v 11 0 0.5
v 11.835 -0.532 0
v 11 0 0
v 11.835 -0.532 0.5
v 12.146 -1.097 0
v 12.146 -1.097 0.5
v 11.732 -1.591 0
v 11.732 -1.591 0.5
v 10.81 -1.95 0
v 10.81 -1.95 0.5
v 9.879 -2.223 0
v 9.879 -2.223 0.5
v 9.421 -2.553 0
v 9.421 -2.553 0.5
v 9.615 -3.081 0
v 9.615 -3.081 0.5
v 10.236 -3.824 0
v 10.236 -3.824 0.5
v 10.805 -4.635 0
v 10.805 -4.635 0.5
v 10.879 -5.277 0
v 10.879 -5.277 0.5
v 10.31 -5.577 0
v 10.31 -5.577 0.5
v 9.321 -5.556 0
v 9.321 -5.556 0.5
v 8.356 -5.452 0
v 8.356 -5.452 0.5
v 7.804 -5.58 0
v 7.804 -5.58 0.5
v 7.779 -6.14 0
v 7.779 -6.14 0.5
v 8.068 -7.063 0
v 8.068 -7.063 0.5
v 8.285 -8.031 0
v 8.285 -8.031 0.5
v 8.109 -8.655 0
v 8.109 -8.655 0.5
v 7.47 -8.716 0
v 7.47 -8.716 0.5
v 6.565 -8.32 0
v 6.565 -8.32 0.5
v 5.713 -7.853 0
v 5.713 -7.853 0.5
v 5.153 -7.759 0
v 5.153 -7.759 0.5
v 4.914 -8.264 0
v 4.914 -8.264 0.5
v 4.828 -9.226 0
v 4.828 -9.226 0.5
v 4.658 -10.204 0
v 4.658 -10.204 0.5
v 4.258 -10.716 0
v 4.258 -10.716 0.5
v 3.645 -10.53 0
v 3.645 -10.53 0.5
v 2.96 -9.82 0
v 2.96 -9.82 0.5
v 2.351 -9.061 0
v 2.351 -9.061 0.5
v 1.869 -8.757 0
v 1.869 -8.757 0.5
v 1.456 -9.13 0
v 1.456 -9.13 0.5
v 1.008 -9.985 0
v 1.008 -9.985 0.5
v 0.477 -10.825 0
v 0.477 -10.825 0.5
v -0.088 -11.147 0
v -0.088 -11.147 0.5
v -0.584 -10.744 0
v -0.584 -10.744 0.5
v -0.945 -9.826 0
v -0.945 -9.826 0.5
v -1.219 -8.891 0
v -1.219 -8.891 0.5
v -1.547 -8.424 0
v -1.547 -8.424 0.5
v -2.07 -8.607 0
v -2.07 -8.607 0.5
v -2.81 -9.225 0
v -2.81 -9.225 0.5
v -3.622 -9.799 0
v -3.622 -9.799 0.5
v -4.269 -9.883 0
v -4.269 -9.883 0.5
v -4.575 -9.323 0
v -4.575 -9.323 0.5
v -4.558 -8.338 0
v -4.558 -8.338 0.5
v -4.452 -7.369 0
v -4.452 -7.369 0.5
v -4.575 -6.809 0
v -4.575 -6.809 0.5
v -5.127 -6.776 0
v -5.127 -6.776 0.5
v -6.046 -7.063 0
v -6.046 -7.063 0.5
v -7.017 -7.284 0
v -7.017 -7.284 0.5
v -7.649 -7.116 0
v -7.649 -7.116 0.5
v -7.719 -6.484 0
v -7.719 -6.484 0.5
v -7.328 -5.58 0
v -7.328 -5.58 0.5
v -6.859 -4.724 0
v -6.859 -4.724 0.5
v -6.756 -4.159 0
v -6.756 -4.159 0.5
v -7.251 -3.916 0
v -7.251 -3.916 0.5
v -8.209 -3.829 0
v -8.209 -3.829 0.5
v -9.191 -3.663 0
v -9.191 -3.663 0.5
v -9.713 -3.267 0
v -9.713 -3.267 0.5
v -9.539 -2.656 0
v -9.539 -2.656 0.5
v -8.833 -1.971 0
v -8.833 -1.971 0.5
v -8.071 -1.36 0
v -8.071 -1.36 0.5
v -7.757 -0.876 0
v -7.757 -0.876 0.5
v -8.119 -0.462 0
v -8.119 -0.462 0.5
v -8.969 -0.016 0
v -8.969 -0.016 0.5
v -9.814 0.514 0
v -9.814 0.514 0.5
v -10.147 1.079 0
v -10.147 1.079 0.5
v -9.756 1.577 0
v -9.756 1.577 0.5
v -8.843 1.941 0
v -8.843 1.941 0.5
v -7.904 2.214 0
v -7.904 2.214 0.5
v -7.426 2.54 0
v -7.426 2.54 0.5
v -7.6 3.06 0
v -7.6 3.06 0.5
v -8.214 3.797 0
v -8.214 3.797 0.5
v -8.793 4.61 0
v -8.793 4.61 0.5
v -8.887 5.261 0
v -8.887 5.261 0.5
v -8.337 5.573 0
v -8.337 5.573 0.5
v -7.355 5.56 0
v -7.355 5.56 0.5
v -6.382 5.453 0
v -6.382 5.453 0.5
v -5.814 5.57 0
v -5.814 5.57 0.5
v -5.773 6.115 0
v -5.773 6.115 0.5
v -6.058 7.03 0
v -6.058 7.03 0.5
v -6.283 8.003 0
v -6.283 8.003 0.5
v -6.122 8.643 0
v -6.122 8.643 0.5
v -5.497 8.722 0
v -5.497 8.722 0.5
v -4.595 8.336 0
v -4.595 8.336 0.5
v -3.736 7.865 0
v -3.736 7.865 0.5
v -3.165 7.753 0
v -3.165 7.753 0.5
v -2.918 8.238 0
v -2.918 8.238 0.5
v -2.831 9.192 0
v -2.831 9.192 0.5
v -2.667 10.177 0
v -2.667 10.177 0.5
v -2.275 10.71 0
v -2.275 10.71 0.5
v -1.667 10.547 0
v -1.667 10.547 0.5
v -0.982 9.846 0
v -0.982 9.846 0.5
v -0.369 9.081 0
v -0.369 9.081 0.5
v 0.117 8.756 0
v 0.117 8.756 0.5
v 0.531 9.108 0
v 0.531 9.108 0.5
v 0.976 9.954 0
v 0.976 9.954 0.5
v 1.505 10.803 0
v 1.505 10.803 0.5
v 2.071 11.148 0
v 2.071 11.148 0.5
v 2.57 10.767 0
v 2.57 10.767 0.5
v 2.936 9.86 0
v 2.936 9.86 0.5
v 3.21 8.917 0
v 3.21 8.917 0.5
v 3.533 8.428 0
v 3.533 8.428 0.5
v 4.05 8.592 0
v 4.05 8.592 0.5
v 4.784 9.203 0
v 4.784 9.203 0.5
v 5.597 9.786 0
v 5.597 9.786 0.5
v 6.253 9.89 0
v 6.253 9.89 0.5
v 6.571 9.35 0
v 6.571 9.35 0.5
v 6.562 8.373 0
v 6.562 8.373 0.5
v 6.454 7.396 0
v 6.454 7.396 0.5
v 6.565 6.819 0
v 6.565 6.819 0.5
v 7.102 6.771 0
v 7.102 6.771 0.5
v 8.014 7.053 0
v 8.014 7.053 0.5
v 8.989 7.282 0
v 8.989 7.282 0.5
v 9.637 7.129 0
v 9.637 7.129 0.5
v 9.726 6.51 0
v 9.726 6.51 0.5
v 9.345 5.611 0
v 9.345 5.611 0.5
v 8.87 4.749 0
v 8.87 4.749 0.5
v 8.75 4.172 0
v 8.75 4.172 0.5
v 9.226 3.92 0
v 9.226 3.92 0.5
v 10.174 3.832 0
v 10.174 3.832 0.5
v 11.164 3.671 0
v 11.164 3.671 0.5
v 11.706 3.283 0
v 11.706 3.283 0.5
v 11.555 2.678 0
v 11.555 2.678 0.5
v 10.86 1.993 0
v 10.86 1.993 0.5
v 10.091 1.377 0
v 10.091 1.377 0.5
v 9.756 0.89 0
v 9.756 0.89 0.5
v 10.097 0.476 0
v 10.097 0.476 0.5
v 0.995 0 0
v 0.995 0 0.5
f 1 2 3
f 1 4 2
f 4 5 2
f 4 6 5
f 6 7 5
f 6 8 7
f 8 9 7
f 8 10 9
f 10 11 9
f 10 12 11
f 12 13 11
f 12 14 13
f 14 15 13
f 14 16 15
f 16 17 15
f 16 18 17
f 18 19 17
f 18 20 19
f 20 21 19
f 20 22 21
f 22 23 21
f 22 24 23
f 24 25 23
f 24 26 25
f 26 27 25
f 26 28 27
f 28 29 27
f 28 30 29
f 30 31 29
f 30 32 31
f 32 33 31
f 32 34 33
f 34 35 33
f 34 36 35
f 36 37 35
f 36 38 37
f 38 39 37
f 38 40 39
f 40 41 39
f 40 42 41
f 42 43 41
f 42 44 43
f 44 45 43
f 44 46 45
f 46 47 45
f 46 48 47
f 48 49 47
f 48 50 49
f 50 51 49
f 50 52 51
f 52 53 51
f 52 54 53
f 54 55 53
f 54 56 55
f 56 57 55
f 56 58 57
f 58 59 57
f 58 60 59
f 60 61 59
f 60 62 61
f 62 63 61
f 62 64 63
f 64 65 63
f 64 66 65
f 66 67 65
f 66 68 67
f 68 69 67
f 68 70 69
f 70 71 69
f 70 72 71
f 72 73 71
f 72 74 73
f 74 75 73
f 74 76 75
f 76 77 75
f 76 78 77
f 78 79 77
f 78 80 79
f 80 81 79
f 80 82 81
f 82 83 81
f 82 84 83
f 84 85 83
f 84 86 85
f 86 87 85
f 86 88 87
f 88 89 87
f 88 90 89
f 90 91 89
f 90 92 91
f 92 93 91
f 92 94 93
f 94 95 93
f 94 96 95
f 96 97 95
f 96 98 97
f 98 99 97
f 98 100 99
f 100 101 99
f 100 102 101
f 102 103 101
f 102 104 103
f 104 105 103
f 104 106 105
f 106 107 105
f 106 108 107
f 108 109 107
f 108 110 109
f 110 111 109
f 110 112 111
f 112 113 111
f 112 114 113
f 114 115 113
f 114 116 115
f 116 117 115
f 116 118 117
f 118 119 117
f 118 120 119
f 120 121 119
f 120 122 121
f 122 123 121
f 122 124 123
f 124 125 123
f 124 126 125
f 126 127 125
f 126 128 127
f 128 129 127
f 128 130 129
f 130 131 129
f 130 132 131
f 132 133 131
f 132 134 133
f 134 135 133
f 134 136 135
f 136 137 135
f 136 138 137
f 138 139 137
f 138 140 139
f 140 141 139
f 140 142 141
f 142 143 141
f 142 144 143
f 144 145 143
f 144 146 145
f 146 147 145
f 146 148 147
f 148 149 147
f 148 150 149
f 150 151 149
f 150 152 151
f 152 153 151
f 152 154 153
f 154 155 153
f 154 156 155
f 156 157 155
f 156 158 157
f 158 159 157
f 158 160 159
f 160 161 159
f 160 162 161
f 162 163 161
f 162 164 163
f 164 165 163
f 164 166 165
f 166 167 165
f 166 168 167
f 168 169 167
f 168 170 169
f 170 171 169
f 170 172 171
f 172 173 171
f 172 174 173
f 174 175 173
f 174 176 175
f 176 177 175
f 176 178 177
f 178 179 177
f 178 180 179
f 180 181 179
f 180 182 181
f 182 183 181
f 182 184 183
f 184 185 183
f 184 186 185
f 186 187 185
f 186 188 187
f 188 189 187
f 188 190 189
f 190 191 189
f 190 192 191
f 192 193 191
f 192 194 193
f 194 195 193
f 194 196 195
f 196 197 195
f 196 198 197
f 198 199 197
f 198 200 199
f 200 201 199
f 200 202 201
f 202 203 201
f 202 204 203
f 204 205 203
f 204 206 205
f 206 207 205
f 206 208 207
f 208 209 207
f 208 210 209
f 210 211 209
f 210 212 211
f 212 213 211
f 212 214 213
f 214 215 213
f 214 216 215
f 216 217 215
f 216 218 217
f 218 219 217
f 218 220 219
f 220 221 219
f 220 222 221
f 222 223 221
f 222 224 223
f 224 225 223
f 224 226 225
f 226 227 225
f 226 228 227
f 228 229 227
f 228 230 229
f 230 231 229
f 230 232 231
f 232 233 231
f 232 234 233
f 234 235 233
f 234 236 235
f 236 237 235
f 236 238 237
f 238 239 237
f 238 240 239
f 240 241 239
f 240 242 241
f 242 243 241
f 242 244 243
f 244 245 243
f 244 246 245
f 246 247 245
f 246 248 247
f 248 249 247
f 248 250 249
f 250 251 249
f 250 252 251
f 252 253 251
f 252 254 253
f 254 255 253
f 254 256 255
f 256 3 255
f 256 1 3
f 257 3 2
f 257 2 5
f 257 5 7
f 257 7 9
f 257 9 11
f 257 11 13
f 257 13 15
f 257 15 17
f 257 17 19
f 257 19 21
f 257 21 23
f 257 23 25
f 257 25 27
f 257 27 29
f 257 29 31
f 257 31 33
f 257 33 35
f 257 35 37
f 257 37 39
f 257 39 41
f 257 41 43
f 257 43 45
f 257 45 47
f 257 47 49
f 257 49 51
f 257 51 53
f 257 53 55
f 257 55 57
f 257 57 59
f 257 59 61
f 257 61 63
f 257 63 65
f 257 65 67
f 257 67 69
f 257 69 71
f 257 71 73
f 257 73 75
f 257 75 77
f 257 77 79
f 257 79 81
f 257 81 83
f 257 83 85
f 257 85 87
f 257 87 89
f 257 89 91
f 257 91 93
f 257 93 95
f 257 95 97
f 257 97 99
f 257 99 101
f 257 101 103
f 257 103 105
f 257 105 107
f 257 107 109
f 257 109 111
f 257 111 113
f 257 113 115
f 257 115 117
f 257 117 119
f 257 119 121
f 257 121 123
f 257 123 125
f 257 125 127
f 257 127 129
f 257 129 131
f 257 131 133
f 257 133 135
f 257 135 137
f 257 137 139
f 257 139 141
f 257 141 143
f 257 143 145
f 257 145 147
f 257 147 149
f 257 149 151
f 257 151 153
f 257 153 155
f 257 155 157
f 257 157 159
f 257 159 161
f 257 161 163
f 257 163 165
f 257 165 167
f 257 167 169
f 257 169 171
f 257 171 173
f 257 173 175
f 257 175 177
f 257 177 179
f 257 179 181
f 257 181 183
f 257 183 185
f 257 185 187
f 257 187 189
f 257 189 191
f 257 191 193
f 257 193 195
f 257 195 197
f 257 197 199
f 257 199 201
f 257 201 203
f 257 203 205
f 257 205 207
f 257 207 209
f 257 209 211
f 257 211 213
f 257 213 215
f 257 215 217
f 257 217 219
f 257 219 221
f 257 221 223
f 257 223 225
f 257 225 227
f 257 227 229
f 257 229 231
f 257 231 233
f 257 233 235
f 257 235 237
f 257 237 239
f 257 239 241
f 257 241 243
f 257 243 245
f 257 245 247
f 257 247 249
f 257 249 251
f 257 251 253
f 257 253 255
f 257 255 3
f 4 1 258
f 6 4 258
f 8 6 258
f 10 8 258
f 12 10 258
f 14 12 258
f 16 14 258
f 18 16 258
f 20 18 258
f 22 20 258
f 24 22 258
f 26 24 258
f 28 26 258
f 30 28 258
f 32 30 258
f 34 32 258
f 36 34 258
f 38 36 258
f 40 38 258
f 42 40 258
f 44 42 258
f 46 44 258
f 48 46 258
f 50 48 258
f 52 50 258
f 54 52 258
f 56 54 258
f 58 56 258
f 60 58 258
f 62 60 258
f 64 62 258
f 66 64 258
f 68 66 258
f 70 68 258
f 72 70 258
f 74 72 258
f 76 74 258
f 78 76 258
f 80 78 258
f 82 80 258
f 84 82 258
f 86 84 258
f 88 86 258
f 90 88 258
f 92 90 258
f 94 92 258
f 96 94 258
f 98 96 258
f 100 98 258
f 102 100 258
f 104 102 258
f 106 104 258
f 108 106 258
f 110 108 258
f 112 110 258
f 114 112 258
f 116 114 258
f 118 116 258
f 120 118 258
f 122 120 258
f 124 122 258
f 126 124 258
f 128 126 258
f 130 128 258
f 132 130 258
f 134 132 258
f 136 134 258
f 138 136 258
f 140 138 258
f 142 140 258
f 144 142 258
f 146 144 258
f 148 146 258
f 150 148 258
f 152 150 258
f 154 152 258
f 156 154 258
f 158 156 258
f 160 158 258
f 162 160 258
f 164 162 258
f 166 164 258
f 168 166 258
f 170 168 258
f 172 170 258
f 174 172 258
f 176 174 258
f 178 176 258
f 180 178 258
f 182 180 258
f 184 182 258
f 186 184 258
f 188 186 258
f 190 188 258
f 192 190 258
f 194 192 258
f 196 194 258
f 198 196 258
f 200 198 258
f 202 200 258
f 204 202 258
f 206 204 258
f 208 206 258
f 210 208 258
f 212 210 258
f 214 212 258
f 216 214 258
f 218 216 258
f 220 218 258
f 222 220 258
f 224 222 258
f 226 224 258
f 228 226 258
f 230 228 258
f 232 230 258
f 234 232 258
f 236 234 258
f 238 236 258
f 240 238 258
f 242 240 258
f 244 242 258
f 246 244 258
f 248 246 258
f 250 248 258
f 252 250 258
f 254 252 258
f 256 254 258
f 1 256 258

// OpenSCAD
polyhedron(points = [[11.0000000000, 0.0000000000, 0.0000000000], [11.8351363400, -0.5320258301, 0.0000000000], [12.1461231838, -1.0972371885, 0.0000000000], [11.7322300093, -1.5911570948, 0.0000000000], [10.8099214478, -1.9502995953, 0.0000000000], [9.8791306480, -2.2229323675, 0.0000000000], [9.4214595540, -2.5532487635, 0.0000000000], [9.6148271876, -3.0807417652, 0.0000000000], [10.2360253014, -3.8235329212, 0.0000000000], [10.8052379229, -4.6348451459, 0.0000000000], [10.8788233153, -5.2771807658, 0.0000000000], [10.3098004925, -5.5766162666, 0.0000000000], [9.3211230182, -5.5564030822, 0.0000000000], [8.3558320703, -5.4517691630, 0.0000000000], [7.8044509523, -5.5803024438, 0.0000000000], [7.7793419608, -6.1398295884, 0.0000000000], [8.0684749308, -7.0628483548, 0.0000000000], [8.2849541990, -8.0308779390, 0.0000000000], [8.1090625920, -8.6545097331, 0.0000000000], [7.4703917519, -8.7156975567, 0.0000000000], [6.5651527847, -8.3198727278, 0.0000000000], [5.7125641226, -7.8531284541, 0.0000000000], [5.1525612866, -7.7586754689, 0.0000000000], [4.9141816948, -8.2636013226, 0.0000000000], [4.8279569349, -9.2259166790, 0.0000000000], [4.6582484471, -10.2041013192, 0.0000000000], [4.2581035377, -10.7155644276, 0.0000000000], [3.6452578388, -10.5304372887, 0.0000000000], [2.9603557827, -9.8196101978, 0.0000000000], [2.3507852572, -9.0611959595, 0.0000000000], [1.8690971097, -8.7570644003, 0.0000000000], [1.4555738863, -9.1297037836, 0.0000000000], [1.0079510920, -9.9847077734, 0.0000000000], [0.4771277793, -10.8246850980, 0.0000000000], [-0.0883502368, -11.1468843506, 0.0000000000], [-0.5841752736, -10.7441080493, 0.0000000000], [-0.9454563534, -9.8264691937, 0.0000000000], [-1.2185000205, -8.8914749874, 0.0000000000], [-1.5465804765, -8.4236183009, 0.0000000000], [-2.0702816783, -8.6071886419, 0.0000000000], [-2.8103401563, -9.2249364455, 0.0000000000], [-3.6223774030, -9.7990508842, 0.0000000000], [-4.2692378566, -9.8828828777, 0.0000000000], [-4.5746890421, -9.3234170946, 0.0000000000], [-4.5582548556, -8.3382662420, 0.0000000000], [-4.4524141166, -7.3689617551, 0.0000000000], [-4.5749978033, -6.8090338428, 0.0000000000], [-5.1272681241, -6.7763096394, 0.0000000000], [-6.0464198802, -7.0632737789, 0.0000000000], [-7.0169680200, -7.2839820642, 0.0000000000], [-7.6486860227, -7.1158206531, 0.0000000000], [-7.7190959812, -6.4836909674, 0.0000000000], [-7.3281387501, -5.5802862457, 0.0000000000], [-6.8587744687, -4.7244680413, 0.0000000000], [-6.7555700750, -4.1588477293, 0.0000000000], [-7.2508676808, -3.9161977586, 0.0000000000], [-8.2087498704, -3.8294326413, 0.0000000000], [-9.1908461358, -3.6626572575, 0.0000000000], [-9.7127219615, -3.2665610246, 0.0000000000], [-9.5386297981, -2.6562393510, 0.0000000000], [-8.8330348198, -1.9711795130, 0.0000000000], [-8.0709990446, -1.3596315233, 0.0000000000], [-7.7566481645, -0.8760981948, 0.0000000000], [-8.1187446897, -0.4623068984, 0.0000000000], [-8.9694117165, -0.0158778328, 0.0000000000], [-9.8140903829, 0.5137291443, 0.0000000000], [-10.1474445523, 1.0794439947, 0.0000000000], [-9.7558435928, 1.5771552818, 0.0000000000], [-8.8430126979, 1.9405874514, 0.0000000000], [-7.9039495841, 2.2140821682, 0.0000000000], [-7.4259582605, 2.5399665878, 0.0000000000], [-7.5996706828, 3.0598826008, 0.0000000000], [-8.2138353123, 3.7971686625, 0.0000000000], [-8.7927276350, 4.6098647533, 0.0000000000], [-8.8867641078, 5.2612003277, 0.0000000000], [-8.3369162357, 5.5726718700, 0.0000000000], [-7.3554148427, 5.5600809533, 0.0000000000], [-6.3822059200, 5.4531219766, 0.0000000000], [-5.8137633996, 5.5698126715, 0.0000000000], [-5.7733657571, 6.1148094030, 0.0000000000], [-6.0580535890, 7.0300068020, 0.0000000000], [-6.2829015154, 8.0029648766, 0.0000000000], [-6.1224500824, 8.6427067341, 0.0000000000], [-5.4969157564, 8.7223660558, 0.0000000000], [-4.5954341475, 8.3363825892, 0.0000000000], [-3.7364534876, 7.8645219821, 0.0000000000], [-3.1652240354, 7.7526311541, 0.0000000000], [-2.9182564725, 8.2382631628, 0.0000000000], [-2.8308851091, 9.1915905798, 0.0000000000], [-2.6670016579, 10.1774637902, 0.0000000000], [-2.2749590999, 10.7096865817, 0.0000000000], [-1.6672010304, 10.5466748458, 0.0000000000], [-0.9820249470, 9.8464438590, 0.0000000000], [-0.3685142804, 9.0809266410, 0.0000000000], [0.1168812903, 8.7564200932, 0.0000000000], [0.5309699946, 9.1079216407, 0.0000000000], [0.9762197709, 9.9541143399, 0.0000000000], [1.5045970151, 10.8033539869, 0.0000000000], [2.0705189357, 11.1478037933, 0.0000000000], [2.5700972038, 10.7674348694, 0.0000000000], [2.9356924172, 9.8595494945, 0.0000000000], [3.2096780647, 8.9165527559, 0.0000000000], [3.5334066407, 8.4284795143, 0.0000000000], [4.0495448029, 8.5922750570, 0.0000000000], [4.7840193925, 9.2027242246, 0.0000000000], [5.5973082664, 9.7862696783, 0.0000000000], [6.2530686221, 9.8904668354, 0.0000000000], [6.5705641552, 9.3502962523, 0.0000000000], [6.5618799972, 8.3725667218, 0.0000000000], [6.4538914076, 7.3955632908, 0.0000000000], [6.5647466527, 6.8186398665, 0.0000000000], [7.1024543383, 6.7705118208, 0.0000000000], [8.0136108877, 7.0528161439, 0.0000000000], [8.9888700754, 7.2817135366, 0.0000000000], [9.6365722174, 7.1289505583, 0.0000000000], [9.7255065997, 6.5100648121, 0.0000000000], [9.3446021703, 5.6105950776, 0.0000000000], [8.8703692689, 4.7485197913, 0.0000000000], [8.7498584267, 4.1716905780, 0.0000000000], [9.2257891833, 3.9203588780, 0.0000000000], [10.1744411215, 3.8323153104, 0.0000000000], [11.1639561112, 3.6712819613, 0.0000000000], [11.7064584966, 3.2832973346, 0.0000000000], [11.5545708468, 2.6781421220, 0.0000000000], [10.8598348583, 1.9928915715, 0.0000000000], [10.0909768929, 1.3774335672, 0.0000000000], [9.7563800627, 0.8901591051, 0.0000000000], [10.0972363362, 0.4757436290, 0.0000000000], [11.0000000000, 0.0000000000, 0.5000000000], [11.8351363400, -0.5320258301, 0.5000000000], [12.1461231838, -1.0972371885, 0.5000000000], [11.7322300093, -1.5911570948, 0.5000000000], [10.8099214478, -1.9502995953, 0.5000000000], [9.8791306480, -2.2229323675, 0.5000000000], [9.4214595540, -2.5532487635, 0.5000000000], [9.6148271876, -3.0807417652, 0.5000000000], [10.2360253014, -3.8235329212, 0.5000000000], [10.8052379229, -4.6348451459, 0.5000000000], [10.8788233153, -5.2771807658, 0.5000000000], [10.3098004925, -5.5766162666, 0.5000000000], [9.3211230182, -5.5564030822, 0.5000000000], [8.3558320703, -5.4517691630, 0.5000000000], [7.8044509523, -5.5803024438, 0.5000000000], [7.7793419608, -6.1398295884, 0.5000000000], [8.0684749308, -7.0628483548, 0.5000000000], [8.2849541990, -8.0308779390, 0.5000000000], [8.1090625920, -8.6545097331, 0.5000000000], [7.4703917519, -8.7156975567, 0.5000000000], [6.5651527847, -8.3198727278, 0.5000000000], [5.7125641226, -7.8531284541, 0.5000000000], [5.1525612866, -7.7586754689, 0.5000000000], [4.9141816948, -8.2636013226, 0.5000000000], [4.8279569349, -9.2259166790, 0.5000000000], [4.6582484471, -10.2041013192, 0.5000000000], [4.2581035377, -10.7155644276, 0.5000000000], [3.6452578388, -10.5304372887, 0.5000000000], [2.9603557827, -9.8196101978, 0.5000000000], [2.3507852572, -9.0611959595, 0.5000000000], [1.8690971097, -8.7570644003, 0.5000000000], [1.4555738863, -9.1297037836, 0.5000000000], [1.0079510920, -9.9847077734, 0.5000000000], [0.4771277793, -10.8246850980, 0.5000000000], [-0.0883502368, -11.1468843506, 0.5000000000], [-0.5841752736, -10.7441080493, 0.5000000000], [-0.9454563534, -9.8264691937, 0.5000000000], [-1.2185000205, -8.8914749874, 0.5000000000], [-1.5465804765, -8.4236183009, 0.5000000000], [-2.0702816783, -8.6071886419, 0.5000000000], [-2.8103401563, -9.2249364455, 0.5000000000], [-3.6223774030, -9.7990508842, 0.5000000000], [-4.2692378566, -9.8828828777, 0.5000000000], [-4.5746890421, -9.3234170946, 0.5000000000], [-4.5582548556, -8.3382662420, 0.5000000000], [-4.4524141166, -7.3689617551, 0.5000000000], [-4.5749978033, -6.8090338428, 0.5000000000], [-5.1272681241, -6.7763096394, 0.5000000000], [-6.0464198802, -7.0632737789, 0.5000000000], [-7.0169680200, -7.2839820642, 0.5000000000], [-7.6486860227, -7.1158206531, 0.5000000000], [-7.7190959812, -6.4836909674, 0.5000000000], [-7.3281387501, -5.5802862457, 0.5000000000], [-6.8587744687, -4.7244680413, 0.5000000000], [-6.7555700750, -4.1588477293, 0.5000000000], [-7.2508676808, -3.9161977586, 0.5000000000], [-8.2087498704, -3.8294326413, 0.5000000000], [-9.1908461358, -3.6626572575, 0.5000000000], [-9.7127219615, -3.2665610246, 0.5000000000], [-9.5386297981, -2.6562393510, 0.5000000000], [-8.8330348198, -1.9711795130, 0.5000000000], [-8.0709990446, -1.3596315233, 0.5000000000], [-7.7566481645, -0.8760981948, 0.5000000000], [-8.1187446897, -0.4623068984, 0.5000000000], [-8.9694117165, -0.0158778328, 0.5000000000], [-9.8140903829, 0.5137291443, 0.5000000000], [-10.1474445523, 1.0794439947, 0.5000000000], [-9.7558435928, 1.5771552818, 0.5000000000], [-8.8430126979, 1.9405874514, 0.5000000000], [-7.9039495841, 2.2140821682, 0.5000000000], [-7.4259582605, 2.5399665878, 0.5000000000], [-7.5996706828, 3.0598826008, 0.5000000000], [-8.2138353123, 3.7971686625, 0.5000000000], [-8.7927276350, 4.6098647533, 0.5000000000], [-8.8867641078, 5.2612003277, 0.5000000000], [-8.3369162357, 5.5726718700, 0.5000000000], [-7.3554148427, 5.5600809533, 0.5000000000], [-6.3822059200, 5.4531219766, 0.5000000000], [-5.8137633996, 5.5698126715, 0.5000000000], [-5.7733657571, 6.1148094030, 0.5000000000], [-6.0580535890, 7.0300068020, 0.5000000000], [-6.2829015154, 8.0029648766, 0.5000000000], [-6.1224500824, 8.6427067341, 0.5000000000], [-5.4969157564, 8.7223660558, 0.5000000000], [-4.5954341475, 8.3363825892, 0.5000000000], [-3.7364534876, 7.8645219821, 0.5000000000], [-3.1652240354, 7.7526311541, 0.5000000000], [-2.9182564725, 8.2382631628, 0.5000000000], [-2.8308851091, 9.1915905798, 0.5000000000], [-2.6670016579, 10.1774637902, 0.5000000000], [-2.2749590999, 10.7096865817, 0.5000000000], [-1.6672010304, 10.5466748458, 0.5000000000], [-0.9820249470, 9.8464438590, 0.5000000000], [-0.3685142804, 9.0809266410, 0.5000000000], [0.1168812903, 8.7564200932, 0.5000000000], [0.5309699946, 9.1079216407, 0.5000000000], [0.9762197709, 9.9541143399, 0.5000000000], [1.5045970151, 10.8033539869, 0.5000000000], [2.0705189357, 11.1478037933, 0.5000000000], [2.5700972038, 10.7674348694, 0.5000000000], [2.9356924172, 9.8595494945, 0.5000000000], [3.2096780647, 8.9165527559, 0.5000000000], [3.5334066407, 8.4284795143, 0.5000000000], [4.0495448029, 8.5922750570, 0.5000000000], [4.7840193925, 9.2027242246, 0.5000000000], [5.5973082664, 9.7862696783, 0.5000000000], [6.2530686221, 9.8904668354, 0.5000000000], [6.5705641552, 9.3502962523, 0.5000000000], [6.5618799972, 8.3725667218, 0.5000000000], [6.4538914076, 7.3955632908, 0.5000000000], [6.5647466527, 6.8186398665, 0.5000000000], [7.1024543383, 6.7705118208, 0.5000000000], [8.0136108877, 7.0528161439, 0.5000000000], [8.9888700754, 7.2817135366, 0.5000000000], [9.6365722174, 7.1289505583, 0.5000000000], [9.7255065997, 6.5100648121, 0.5000000000], [9.3446021703, 5.6105950776, 0.5000000000], [8.8703692689, 4.7485197913, 0.5000000000], [8.7498584267, 4.1716905780, 0.5000000000], [9.2257891833, 3.9203588780, 0.5000000000], [10.1744411215, 3.8323153104, 0.5000000000], [11.1639561112, 3.6712819613, 0.5000000000], [11.7064584966, 3.2832973346, 0.5000000000], [11.5545708468, 2.6781421220, 0.5000000000], [10.8598348583, 1.9928915715, 0.5000000000], [10.0909768929, 1.3774335672, 0.5000000000], [9.7563800627, 0.8901591051, 0.5000000000], [10.0972363362, 0.4757436290, 0.5000000000], [0.9951825649, -0.0001277229, 0.0000000000], [0.9951825649, -0.0001277229, 0.5000000000]], triangles = [[0, 1, 128], [1, 129, 128], [1, 2, 129], [2, 130, 129], [2, 3, 130], [3, 131, 130], [3, 4, 131], [4, 132, 131], [4, 5, 132], [5, 133, 132], [5, 6, 133], [6, 134, 133], [6, 7, 134], [7, 135, 134], [7, 8, 135], [8, 136, 135], [8, 9, 136], [9, 137, 136], [9, 10, 137], [10, 138, 137], [10, 11, 138], [11, 139, 138], [11, 12, 139], [12, 140, 139], [12, 13, 140], [13, 141, 140], [13, 14, 141], [14, 142, 141], [14, 15, 142], [15, 143, 142], [15, 16, 143], [16, 144, 143], [16, 17, 144], [17, 145, 144], [17, 18, 145], [18, 146, 145], [18, 19, 146], [19, 147, 146], [19, 20, 147], [20, 148, 147], [20, 21, 148], [21, 149, 148], [21, 22, 149], [22, 150, 149], [22, 23, 150], [23, 151, 150], [23, 24, 151], [24, 152, 151], [24, 25, 152], [25, 153, 152], [25, 26, 153], [26, 154, 153], [26, 27, 154], [27, 155, 154], [27, 28, 155], [28, 156, 155], [28, 29, 156], [29, 157, 156], [29, 30, 157], [30, 158, 157], [30, 31, 158], [31, 159, 158], [31, 32, 159], [32, 160, 159], [32, 33, 160], [33, 161, 160], [33, 34, 161], [34, 162, 161], [34, 35, 162], [35, 163, 162], [35, 36, 163], [36, 164, 163], [36, 37, 164], [37, 165, 164], [37, 38, 165], [38, 166, 165], [38, 39, 166], [39, 167, 166], [39, 40, 167], [40, 168, 167], [40, 41, 168], [41, 169, 168], [41, 42, 169], [42, 170, 169], [42, 43, 170], [43, 171, 170], [43, 44, 171], [44, 172, 171], [44, 45, 172], [45, 173, 172], [45, 46, 173], [46, 174, 173], [46, 47, 174], [47, 175, 174], [47, 48, 175], [48, 176, 175], [48, 49, 176], [49, 177, 176], [49, 50, 177], [50, 178, 177], [50, 51, 178], [51, 179, 178], [51, 52, 179], [52, 180, 179], [52, 53, 180], [53, 181, 180], [53, 54, 181], [54, 182, 181], [54, 55, 182], [55, 183, 182], [55, 56, 183], [56, 184, 183], [56, 57, 184], [57, 185, 184], [57, 58, 185], [58, 186, 185], [58, 59, 186], [59, 187, 186], [59, 60, 187], [60, 188, 187], [60, 61, 188], [61, 189, 188], [61, 62, 189], [62, 190, 189], [62, 63, 190], [63, 191, 190], [63, 64, 191], [64, 192, 191], [64, 65, 192], [65, 193, 192], [65, 66, 193], [66, 194, 193], [66, 67, 194], [67, 195, 194], [67, 68, 195], [68, 196, 195], [68, 69, 196], [69, 197, 196], [69, 70, 197], [70, 198, 197], [70, 71, 198], [71, 199, 198], [71, 72, 199], [72, 200, 199], [72, 73, 200], [73, 201, 200], [73, 74, 201], [74, 202, 201], [74, 75, 202], [75, 203, 202], [75, 76, 203], [76, 204, 203], [76, 77, 204], [77, 205, 204], [77, 78, 205], [78, 206, 205], [78, 79, 206], [79, 207, 206], [79, 80, 207], [80, 208, 207], [80, 81, 208], [81, 209, 208], [81, 82, 209], [82, 210, 209], [82, 83, 210], [83, 211, 210], [83, 84, 211], [84, 212, 211], [84, 85, 212], [85, 213, 212], [85, 86, 213], [86, 214, 213], [86, 87, 214], [87, 215, 214], [87, 88, 215], [88, 216, 215], [88, 89, 216], [89, 217, 216], [89, 90, 217], [90, 218, 217], [90, 91, 218], [91, 219, 218], [91, 92, 219], [92, 220, 219], [92, 93, 220], [93, 221, 220], [93, 94, 221], [94, 222, 221], [94, 95, 222], [95, 223, 222], [95, 96, 223], [96, 224, 223], [96, 97, 224], [97, 225, 224], [97, 98, 225], [98, 226, 225], [98, 99, 226], [99, 227, 226], [99, 100, 227], [100, 228, 227], [100, 101, 228], [101, 229, 228], [101, 102, 229], [102, 230, 229], [102, 103, 230], [103, 231, 230], [103, 104, 231], [104, 232, 231], [104, 105, 232], [105, 233, 232], [105, 106, 233], [106, 234, 233], [106, 107, 234], [107, 235, 234], [107, 108, 235], [108, 236, 235], [108, 109, 236], [109, 237, 236], [109, 110, 237], [110, 238, 237], [110, 111, 238], [111, 239, 238], [111, 112, 239], [112, 240, 239], [112, 113, 240], [113, 241, 240], [113, 114, 241], [114, 242, 241], [114, 115, 242], [115, 243, 242], [115, 116, 243], [116, 244, 243], [116, 117, 244], [117, 245, 244], [117, 118, 245], [118, 246, 245], [118, 119, 246], [119, 247, 246], [119, 120, 247], [120, 248, 247], [120, 121, 248], [121, 249, 248], [121, 122, 249], [122, 250, 249], [122, 123, 250], [123, 251, 250], [123, 124, 251], [124, 252, 251], [124, 125, 252], [125, 253, 252], [125, 126, 253], [126, 254, 253], [126, 127, 254], [127, 255, 254], [127, 0, 255], [0, 128, 255], [1, 0, 256], [2, 1, 256], [3, 2, 256], [4, 3, 256], [5, 4, 256], [6, 5, 256], [7, 6, 256], [8, 7, 256], [9, 8, 256], [10, 9, 256], [11, 10, 256], [12, 11, 256], [13, 12, 256], [14, 13, 256], [15, 14, 256], [16, 15, 256], [17, 16, 256], [18, 17, 256], [19, 18, 256], [20, 19, 256], [21, 20, 256], [22, 21, 256], [23, 22, 256], [24, 23, 256], [25, 24, 256], [26, 25, 256], [27, 26, 256], [28, 27, 256], [29, 28, 256], [30, 29, 256], [31, 30, 256], [32, 31, 256], [33, 32, 256], [34, 33, 256], [35, 34, 256], [36, 35, 256], [37, 36, 256], [38, 37, 256], [39, 38, 256], [40, 39, 256], [41, 40, 256], [42, 41, 256], [43, 42, 256], [44, 43, 256], [45, 44, 256], [46, 45, 256], [47, 46, 256], [48, 47, 256], [49, 48, 256], [50, 49, 256], [51, 50, 256], [52, 51, 256], [53, 52, 256], [54, 53, 256], [55, 54, 256], [56, 55, 256], [57, 56, 256], [58, 57, 256], [59, 58, 256], [60, 59, 256], [61, 60, 256], [62, 61, 256], [63, 62, 256], [64, 63, 256], [65, 64, 256], [66, 65, 256], [67, 66, 256], [68, 67, 256], [69, 68, 256], [70, 69, 256], [71, 70, 256], [72, 71, 256], [73, 72, 256], [74, 73, 256], [75, 74, 256], [76, 75, 256], [77, 76, 256], [78, 77, 256], [79, 78, 256], [80, 79, 256], [81, 80, 256], [82, 81, 256], [83, 82, 256], [84, 83, 256], [85, 84, 256], [86, 85, 256], [87, 86, 256], [88, 87, 256], [89, 88, 256], [90, 89, 256], [91, 90, 256], [92, 91, 256], [93, 92, 256], [94, 93, 256], [95, 94, 256], [96, 95, 256], [97, 96, 256], [98, 97, 256], [99, 98, 256], [100, 99, 256], [101, 100, 256], [102, 101, 256], [103, 102, 256], [104, 103, 256], [105, 104, 256], [106, 105, 256], [107, 106, 256], [108, 107, 256], [109, 108, 256], [110, 109, 256], [111, 110, 256], [112, 111, 256], [113, 112, 256], [114, 113, 256], [115, 114, 256], [116, 115, 256], [117, 116, 256], [118, 117, 256], [119, 118, 256], [120, 119, 256], [121, 120, 256], [122, 121, 256], [123, 122, 256], [124, 123, 256], [125, 124, 256], [126, 125, 256], [127, 126, 256], [0, 127, 256], [257, 128, 129], [257, 129, 130], [257, 130, 131], [257, 131, 132], [257, 132, 133], [257, 133, 134], [257, 134, 135], [257, 135, 136], [257, 136, 137], [257, 137, 138], [257, 138, 139], [257, 139, 140], [257, 140, 141], [257, 141, 142], [257, 142, 143], [257, 143, 144], [257, 144, 145], [257, 145, 146], [257, 146, 147], [257, 147, 148], [257, 148, 149], [257, 149, 150], [257, 150, 151], [257, 151, 152], [257, 152, 153], [257, 153, 154], [257, 154, 155], [257, 155, 156], [257, 156, 157], [257, 157, 158], [257, 158, 159], [257, 159, 160], [257, 160, 161], [257, 161, 162], [257, 162, 163], [257, 163, 164], [257, 164, 165], [257, 165, 166], [257, 166, 167], [257, 167, 168], [257, 168, 169], [257, 169, 170], [257, 170, 171], [257, 171, 172], [257, 172, 173], [257, 173, 174], [257, 174, 175], [257, 175, 176], [257, 176, 177], [257, 177, 178], [257, 178, 179], [257, 179, 180], [257, 180, 181], [257, 181, 182], [257, 182, 183], [257, 183, 184], [257, 184, 185], [257, 185, 186], [257, 186, 187], [257, 187, 188], [257, 188, 189], [257, 189, 190], [257, 190, 191], [257, 191, 192], [257, 192, 193], [257, 193, 194], [257, 194, 195], [257, 195, 196], [257, 196, 197], [257, 197, 198], [257, 198, 199], [257, 199, 200], [257, 200, 201], [257, 201, 202], [257, 202, 203], [257, 203, 204], [257, 204, 205], [257, 205, 206], [257, 206, 207], [257, 207, 208], [257, 208, 209], [257, 209, 210], [257, 210, 211], [257, 211, 212], [257, 212, 213], [257, 213, 214], [257, 214, 215], [257, 215, 216], [257, 216, 217], [257, 217, 218], [257, 218, 219], [257, 219, 220], [257, 220, 221], [257, 221, 222], [257, 222, 223], [257, 223, 224], [257, 224, 225], [257, 225, 226], [257, 226, 227], [257, 227, 228], [257, 228, 229], [257, 229, 230], [257, 230, 231], [257, 231, 232], [257, 232, 233], [257, 233, 234], [257, 234, 235], [257, 235, 236], [257, 236, 237], [257, 237, 238], [257, 238, 239], [257, 239, 240], [257, 240, 241], [257, 241, 242], [257, 242, 243], [257, 243, 244], [257, 244, 245], [257, 245, 246], [257, 246, 247], [257, 247, 248], [257, 248, 249], [257, 249, 250], [257, 250, 251], [257, 251, 252], [257, 252, 253], [257, 253, 254], [257, 254, 255], [257, 255, 128]]);
/***********************************************
******      SolidPython code:      *************
************************************************
 
from solid import *
import random
import sys
from math import *
from random import *

sys.path.append( "../../../" )
from zack.lib.mat import *
from zack.lib.pathmat import *



def radialFunc( i, heightSegCount, j, radialSegCount ):
	t = 3.14 * 2.0 * float(j) / float(radialSegCount)
	radius = 10
	n = 2.0 * 3.14 * 16 * j / radialSegCount
	return Vec3( [ (1.2 * sin(n) + radius) * cos(t), (1.2 * sin(n) + radius) * sin(t), 0 ] )


path = [ Vec3([1,0,0]), Vec3([1,0,1]) ]
pathMat = pathToPathMat( path )

all = extrudeTubeAlongPath( 128, len(pathMat), pathMat, 10, radialFunc )

scad_render_to_file(
	all, "cyn_gears.scad"
)


 
 
***********************************************/
                            
